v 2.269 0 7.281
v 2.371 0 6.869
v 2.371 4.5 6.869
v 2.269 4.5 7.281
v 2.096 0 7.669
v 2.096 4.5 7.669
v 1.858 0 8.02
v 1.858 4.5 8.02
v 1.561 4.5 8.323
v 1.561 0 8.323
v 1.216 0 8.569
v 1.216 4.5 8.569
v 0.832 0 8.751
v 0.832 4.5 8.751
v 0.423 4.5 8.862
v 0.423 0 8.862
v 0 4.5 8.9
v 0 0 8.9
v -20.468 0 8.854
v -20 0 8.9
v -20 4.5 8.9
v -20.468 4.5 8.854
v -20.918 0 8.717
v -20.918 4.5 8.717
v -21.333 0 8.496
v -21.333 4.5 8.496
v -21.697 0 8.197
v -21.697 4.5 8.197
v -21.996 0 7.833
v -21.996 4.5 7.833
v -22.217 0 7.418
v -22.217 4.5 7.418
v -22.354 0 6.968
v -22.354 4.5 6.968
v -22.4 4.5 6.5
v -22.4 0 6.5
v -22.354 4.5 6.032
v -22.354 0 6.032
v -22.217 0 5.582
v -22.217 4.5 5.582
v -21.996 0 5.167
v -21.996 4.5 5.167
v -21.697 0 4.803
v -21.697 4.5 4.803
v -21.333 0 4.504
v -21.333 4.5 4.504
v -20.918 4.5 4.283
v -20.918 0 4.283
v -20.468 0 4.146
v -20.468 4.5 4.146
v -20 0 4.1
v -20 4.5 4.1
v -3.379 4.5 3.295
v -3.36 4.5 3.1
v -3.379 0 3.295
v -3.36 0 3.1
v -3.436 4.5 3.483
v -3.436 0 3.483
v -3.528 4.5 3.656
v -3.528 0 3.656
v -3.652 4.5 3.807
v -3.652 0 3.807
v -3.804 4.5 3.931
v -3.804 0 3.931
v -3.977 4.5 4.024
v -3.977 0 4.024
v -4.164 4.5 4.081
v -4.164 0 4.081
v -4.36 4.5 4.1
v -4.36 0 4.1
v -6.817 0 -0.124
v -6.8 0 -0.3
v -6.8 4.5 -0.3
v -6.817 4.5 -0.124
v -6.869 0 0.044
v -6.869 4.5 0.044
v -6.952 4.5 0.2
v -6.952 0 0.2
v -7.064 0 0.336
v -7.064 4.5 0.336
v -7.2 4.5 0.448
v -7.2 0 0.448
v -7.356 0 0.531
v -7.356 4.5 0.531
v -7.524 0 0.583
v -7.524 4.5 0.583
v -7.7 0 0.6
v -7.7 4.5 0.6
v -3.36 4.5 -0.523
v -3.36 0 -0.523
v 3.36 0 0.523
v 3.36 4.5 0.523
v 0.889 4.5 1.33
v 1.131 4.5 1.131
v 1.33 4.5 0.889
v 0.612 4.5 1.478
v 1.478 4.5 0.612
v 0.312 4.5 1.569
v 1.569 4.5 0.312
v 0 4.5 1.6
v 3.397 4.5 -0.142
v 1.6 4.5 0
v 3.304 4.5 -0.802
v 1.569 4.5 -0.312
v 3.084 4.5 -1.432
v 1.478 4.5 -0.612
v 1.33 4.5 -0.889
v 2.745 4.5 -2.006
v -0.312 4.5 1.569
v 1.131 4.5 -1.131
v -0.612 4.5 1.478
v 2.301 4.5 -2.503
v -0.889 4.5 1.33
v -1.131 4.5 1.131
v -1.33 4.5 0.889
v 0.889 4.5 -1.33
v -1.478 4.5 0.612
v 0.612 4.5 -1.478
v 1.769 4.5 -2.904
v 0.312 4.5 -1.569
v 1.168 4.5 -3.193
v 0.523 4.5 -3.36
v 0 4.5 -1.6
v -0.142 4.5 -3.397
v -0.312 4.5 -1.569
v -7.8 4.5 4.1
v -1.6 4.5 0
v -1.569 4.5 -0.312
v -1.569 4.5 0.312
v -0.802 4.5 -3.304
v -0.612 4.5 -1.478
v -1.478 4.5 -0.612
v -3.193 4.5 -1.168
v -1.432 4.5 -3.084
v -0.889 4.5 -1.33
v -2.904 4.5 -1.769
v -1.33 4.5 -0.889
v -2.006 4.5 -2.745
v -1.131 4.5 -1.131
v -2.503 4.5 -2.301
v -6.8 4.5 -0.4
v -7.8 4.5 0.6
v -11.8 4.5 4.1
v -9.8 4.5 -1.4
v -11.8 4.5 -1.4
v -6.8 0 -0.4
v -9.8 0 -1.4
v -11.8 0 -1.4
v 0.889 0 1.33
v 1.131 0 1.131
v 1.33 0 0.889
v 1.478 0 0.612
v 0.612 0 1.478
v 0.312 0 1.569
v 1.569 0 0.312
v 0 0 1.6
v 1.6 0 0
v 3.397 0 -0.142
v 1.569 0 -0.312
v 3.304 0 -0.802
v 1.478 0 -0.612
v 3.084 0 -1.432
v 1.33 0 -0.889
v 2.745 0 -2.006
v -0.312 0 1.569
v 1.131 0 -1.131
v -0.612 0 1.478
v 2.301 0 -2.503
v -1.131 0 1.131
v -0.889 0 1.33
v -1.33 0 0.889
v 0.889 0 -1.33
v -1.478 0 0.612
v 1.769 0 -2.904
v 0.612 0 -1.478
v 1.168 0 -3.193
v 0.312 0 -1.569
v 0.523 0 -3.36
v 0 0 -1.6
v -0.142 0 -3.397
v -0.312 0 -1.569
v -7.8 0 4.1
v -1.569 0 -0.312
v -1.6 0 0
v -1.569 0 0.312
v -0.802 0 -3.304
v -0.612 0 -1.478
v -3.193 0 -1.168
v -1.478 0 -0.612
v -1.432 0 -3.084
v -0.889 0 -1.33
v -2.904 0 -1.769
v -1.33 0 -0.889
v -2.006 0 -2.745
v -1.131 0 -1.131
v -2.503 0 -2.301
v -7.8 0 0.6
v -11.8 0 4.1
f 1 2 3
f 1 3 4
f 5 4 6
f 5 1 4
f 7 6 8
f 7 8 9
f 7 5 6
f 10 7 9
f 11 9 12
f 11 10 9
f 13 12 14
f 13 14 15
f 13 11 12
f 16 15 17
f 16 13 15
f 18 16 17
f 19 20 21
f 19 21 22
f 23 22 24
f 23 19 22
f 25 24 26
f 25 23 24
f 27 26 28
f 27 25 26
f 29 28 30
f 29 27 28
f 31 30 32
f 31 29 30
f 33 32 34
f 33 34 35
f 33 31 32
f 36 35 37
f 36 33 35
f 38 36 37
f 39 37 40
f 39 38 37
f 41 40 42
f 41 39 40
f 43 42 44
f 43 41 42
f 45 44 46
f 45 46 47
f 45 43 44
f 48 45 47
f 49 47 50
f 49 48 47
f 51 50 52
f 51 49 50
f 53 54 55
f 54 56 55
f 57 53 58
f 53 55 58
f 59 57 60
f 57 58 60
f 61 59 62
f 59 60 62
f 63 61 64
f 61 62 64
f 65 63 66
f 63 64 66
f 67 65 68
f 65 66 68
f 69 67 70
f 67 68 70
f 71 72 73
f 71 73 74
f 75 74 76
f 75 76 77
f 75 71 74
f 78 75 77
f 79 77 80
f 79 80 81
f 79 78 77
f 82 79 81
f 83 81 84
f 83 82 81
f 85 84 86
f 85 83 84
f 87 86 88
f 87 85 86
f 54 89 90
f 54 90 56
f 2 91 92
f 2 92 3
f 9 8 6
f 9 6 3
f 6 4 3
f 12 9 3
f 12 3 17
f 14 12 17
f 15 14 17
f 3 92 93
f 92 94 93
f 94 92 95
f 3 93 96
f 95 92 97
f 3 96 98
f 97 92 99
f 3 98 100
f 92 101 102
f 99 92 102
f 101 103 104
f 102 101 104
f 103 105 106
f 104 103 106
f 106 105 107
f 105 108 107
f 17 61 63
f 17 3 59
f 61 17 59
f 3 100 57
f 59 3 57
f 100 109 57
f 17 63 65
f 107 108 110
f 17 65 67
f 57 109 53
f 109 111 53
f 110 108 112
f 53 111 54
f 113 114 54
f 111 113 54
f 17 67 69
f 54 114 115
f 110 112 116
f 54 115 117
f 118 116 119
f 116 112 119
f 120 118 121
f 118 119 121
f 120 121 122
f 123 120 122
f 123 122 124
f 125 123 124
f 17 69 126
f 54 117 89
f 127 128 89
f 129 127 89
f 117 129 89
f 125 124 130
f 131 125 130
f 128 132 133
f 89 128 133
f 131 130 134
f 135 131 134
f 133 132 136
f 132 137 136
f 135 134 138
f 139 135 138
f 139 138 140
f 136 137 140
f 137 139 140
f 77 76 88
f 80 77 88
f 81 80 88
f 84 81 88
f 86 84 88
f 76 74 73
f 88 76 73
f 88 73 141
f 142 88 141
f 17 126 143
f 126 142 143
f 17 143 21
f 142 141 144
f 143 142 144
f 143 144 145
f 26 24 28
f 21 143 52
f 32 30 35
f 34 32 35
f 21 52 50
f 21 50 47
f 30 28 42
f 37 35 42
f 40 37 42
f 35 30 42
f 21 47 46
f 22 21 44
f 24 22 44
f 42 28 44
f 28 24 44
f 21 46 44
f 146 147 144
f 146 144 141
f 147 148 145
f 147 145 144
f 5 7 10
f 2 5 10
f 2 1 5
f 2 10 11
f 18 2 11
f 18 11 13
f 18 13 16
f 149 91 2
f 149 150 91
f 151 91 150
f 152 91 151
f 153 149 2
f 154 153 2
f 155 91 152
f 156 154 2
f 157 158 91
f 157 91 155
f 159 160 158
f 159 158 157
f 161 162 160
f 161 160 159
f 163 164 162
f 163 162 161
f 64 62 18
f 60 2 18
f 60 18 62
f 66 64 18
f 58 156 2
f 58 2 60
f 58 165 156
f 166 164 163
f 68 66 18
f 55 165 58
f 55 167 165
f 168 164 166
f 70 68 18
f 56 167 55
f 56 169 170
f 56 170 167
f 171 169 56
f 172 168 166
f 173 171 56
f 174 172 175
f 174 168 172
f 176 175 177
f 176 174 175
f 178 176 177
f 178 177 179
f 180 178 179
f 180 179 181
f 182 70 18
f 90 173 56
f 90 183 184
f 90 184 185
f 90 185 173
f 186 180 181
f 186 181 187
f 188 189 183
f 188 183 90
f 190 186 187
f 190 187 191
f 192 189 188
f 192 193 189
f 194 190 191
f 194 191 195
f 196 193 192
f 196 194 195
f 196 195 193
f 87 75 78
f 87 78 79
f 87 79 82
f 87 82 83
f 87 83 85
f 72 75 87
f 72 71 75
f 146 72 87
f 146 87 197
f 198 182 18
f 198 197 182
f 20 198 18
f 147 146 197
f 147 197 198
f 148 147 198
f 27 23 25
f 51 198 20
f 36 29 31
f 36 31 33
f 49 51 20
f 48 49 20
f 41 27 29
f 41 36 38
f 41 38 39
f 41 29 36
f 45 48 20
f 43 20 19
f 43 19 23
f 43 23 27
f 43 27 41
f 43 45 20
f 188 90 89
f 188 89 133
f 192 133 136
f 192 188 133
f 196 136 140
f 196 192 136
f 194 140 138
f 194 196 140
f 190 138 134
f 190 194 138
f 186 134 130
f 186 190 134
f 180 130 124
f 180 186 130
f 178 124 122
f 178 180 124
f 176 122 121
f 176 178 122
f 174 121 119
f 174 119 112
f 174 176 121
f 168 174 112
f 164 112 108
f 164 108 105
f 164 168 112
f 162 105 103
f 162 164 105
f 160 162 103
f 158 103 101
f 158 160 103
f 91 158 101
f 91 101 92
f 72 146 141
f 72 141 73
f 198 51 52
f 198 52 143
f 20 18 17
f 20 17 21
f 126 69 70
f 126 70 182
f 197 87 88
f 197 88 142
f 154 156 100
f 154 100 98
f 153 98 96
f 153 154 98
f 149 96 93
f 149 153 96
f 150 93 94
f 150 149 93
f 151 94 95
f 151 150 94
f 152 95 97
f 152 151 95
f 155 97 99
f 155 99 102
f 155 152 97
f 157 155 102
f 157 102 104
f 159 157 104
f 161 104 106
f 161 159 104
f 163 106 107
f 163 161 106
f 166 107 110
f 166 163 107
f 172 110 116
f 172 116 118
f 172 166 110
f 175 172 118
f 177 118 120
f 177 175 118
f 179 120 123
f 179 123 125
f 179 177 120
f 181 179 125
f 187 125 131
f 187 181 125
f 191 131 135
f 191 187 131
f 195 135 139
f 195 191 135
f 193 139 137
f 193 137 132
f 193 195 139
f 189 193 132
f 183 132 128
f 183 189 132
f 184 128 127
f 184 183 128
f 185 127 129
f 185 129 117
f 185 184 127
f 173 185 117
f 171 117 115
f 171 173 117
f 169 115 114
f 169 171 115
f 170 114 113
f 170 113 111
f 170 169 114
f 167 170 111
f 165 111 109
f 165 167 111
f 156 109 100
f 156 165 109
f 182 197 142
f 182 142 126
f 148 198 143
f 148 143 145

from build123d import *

# Parameters (mm, degrees)
SKETCH1_R           = 1.6
BOSS_EXTRUDE1_DEPTH = 4.5
CUT_EXTRUDE1_DEPTH  = 10
FILLET1_R           = 1


with BuildPart() as part:
    # Sketch1 → Boss-Extrude1 (new body)
    with BuildSketch(Plane(origin=(0, 0, 0), x_dir=(1, 0, 0), z_dir=(0, 1, 0))):
        with BuildLine():
            Line((3.359522367, -0.523076923), (2.371427553, -6.869230769))
            ThreePointArc((2.371427553, -6.869230769), (1.561064725, -8.322930861), (0, -8.9))
            Line((0, -8.9), (-20, -8.9))
            ThreePointArc((-20, -8.9), (-22.4, -6.5), (-20, -4.1))
            Line((-20, -4.1), (-11.8, -4.1))
            Line((-11.8, -4.1), (-11.8, 1.4))
            Line((-11.8, 1.4), (-9.8, 1.4))
            Line((-9.8, 1.4), (-6.8, 0.4))
            Line((-6.8, 0.4), (-6.8, 0.3))
            ThreePointArc((-6.8, 0.3), (-7.063603897, -0.336396103), (-7.7, -0.6))
            Line((-7.7, -0.6), (-7.8, -0.6))
            Line((-7.8, -0.6), (-7.8, -4.1))
            Line((-7.8, -4.1), (-4.079334467, -4.1))
            Line((-4.079334467, -4.1), (-3.359522367, 0.523076923))
            ThreePointArc((-3.359522367, 0.523076923), (0.523076923, 3.359522367), (3.359522367, -0.523076923))
        make_face()
        with Locations(Location((0, 0, 0), (0, 0, 270))):
            Circle(SKETCH1_R, mode=Mode.SUBTRACT)
    extrude(amount=BOSS_EXTRUDE1_DEPTH)

    # Sketch2 → Cut-Extrude1 (cut)
    with BuildSketch(Plane(origin=(0, 4.5, 0), x_dir=(1, 0, 0), z_dir=(0, 1, 0))):
        Polygon((-3.359522367, 0.523076923), (-3.359522367, -4.1), (-4.079334467, -4.1), align=None)
    extrude(amount=-CUT_EXTRUDE1_DEPTH, mode=Mode.SUBTRACT)

    # Fillet1
    fillet1_edges = [part.edges().sort_by_distance(p)[0] for p in [
        (-3.359522367, 2.25, 4.1),
    ]]
    fillet(fillet1_edges, radius=FILLET1_R)


solid = part.part
